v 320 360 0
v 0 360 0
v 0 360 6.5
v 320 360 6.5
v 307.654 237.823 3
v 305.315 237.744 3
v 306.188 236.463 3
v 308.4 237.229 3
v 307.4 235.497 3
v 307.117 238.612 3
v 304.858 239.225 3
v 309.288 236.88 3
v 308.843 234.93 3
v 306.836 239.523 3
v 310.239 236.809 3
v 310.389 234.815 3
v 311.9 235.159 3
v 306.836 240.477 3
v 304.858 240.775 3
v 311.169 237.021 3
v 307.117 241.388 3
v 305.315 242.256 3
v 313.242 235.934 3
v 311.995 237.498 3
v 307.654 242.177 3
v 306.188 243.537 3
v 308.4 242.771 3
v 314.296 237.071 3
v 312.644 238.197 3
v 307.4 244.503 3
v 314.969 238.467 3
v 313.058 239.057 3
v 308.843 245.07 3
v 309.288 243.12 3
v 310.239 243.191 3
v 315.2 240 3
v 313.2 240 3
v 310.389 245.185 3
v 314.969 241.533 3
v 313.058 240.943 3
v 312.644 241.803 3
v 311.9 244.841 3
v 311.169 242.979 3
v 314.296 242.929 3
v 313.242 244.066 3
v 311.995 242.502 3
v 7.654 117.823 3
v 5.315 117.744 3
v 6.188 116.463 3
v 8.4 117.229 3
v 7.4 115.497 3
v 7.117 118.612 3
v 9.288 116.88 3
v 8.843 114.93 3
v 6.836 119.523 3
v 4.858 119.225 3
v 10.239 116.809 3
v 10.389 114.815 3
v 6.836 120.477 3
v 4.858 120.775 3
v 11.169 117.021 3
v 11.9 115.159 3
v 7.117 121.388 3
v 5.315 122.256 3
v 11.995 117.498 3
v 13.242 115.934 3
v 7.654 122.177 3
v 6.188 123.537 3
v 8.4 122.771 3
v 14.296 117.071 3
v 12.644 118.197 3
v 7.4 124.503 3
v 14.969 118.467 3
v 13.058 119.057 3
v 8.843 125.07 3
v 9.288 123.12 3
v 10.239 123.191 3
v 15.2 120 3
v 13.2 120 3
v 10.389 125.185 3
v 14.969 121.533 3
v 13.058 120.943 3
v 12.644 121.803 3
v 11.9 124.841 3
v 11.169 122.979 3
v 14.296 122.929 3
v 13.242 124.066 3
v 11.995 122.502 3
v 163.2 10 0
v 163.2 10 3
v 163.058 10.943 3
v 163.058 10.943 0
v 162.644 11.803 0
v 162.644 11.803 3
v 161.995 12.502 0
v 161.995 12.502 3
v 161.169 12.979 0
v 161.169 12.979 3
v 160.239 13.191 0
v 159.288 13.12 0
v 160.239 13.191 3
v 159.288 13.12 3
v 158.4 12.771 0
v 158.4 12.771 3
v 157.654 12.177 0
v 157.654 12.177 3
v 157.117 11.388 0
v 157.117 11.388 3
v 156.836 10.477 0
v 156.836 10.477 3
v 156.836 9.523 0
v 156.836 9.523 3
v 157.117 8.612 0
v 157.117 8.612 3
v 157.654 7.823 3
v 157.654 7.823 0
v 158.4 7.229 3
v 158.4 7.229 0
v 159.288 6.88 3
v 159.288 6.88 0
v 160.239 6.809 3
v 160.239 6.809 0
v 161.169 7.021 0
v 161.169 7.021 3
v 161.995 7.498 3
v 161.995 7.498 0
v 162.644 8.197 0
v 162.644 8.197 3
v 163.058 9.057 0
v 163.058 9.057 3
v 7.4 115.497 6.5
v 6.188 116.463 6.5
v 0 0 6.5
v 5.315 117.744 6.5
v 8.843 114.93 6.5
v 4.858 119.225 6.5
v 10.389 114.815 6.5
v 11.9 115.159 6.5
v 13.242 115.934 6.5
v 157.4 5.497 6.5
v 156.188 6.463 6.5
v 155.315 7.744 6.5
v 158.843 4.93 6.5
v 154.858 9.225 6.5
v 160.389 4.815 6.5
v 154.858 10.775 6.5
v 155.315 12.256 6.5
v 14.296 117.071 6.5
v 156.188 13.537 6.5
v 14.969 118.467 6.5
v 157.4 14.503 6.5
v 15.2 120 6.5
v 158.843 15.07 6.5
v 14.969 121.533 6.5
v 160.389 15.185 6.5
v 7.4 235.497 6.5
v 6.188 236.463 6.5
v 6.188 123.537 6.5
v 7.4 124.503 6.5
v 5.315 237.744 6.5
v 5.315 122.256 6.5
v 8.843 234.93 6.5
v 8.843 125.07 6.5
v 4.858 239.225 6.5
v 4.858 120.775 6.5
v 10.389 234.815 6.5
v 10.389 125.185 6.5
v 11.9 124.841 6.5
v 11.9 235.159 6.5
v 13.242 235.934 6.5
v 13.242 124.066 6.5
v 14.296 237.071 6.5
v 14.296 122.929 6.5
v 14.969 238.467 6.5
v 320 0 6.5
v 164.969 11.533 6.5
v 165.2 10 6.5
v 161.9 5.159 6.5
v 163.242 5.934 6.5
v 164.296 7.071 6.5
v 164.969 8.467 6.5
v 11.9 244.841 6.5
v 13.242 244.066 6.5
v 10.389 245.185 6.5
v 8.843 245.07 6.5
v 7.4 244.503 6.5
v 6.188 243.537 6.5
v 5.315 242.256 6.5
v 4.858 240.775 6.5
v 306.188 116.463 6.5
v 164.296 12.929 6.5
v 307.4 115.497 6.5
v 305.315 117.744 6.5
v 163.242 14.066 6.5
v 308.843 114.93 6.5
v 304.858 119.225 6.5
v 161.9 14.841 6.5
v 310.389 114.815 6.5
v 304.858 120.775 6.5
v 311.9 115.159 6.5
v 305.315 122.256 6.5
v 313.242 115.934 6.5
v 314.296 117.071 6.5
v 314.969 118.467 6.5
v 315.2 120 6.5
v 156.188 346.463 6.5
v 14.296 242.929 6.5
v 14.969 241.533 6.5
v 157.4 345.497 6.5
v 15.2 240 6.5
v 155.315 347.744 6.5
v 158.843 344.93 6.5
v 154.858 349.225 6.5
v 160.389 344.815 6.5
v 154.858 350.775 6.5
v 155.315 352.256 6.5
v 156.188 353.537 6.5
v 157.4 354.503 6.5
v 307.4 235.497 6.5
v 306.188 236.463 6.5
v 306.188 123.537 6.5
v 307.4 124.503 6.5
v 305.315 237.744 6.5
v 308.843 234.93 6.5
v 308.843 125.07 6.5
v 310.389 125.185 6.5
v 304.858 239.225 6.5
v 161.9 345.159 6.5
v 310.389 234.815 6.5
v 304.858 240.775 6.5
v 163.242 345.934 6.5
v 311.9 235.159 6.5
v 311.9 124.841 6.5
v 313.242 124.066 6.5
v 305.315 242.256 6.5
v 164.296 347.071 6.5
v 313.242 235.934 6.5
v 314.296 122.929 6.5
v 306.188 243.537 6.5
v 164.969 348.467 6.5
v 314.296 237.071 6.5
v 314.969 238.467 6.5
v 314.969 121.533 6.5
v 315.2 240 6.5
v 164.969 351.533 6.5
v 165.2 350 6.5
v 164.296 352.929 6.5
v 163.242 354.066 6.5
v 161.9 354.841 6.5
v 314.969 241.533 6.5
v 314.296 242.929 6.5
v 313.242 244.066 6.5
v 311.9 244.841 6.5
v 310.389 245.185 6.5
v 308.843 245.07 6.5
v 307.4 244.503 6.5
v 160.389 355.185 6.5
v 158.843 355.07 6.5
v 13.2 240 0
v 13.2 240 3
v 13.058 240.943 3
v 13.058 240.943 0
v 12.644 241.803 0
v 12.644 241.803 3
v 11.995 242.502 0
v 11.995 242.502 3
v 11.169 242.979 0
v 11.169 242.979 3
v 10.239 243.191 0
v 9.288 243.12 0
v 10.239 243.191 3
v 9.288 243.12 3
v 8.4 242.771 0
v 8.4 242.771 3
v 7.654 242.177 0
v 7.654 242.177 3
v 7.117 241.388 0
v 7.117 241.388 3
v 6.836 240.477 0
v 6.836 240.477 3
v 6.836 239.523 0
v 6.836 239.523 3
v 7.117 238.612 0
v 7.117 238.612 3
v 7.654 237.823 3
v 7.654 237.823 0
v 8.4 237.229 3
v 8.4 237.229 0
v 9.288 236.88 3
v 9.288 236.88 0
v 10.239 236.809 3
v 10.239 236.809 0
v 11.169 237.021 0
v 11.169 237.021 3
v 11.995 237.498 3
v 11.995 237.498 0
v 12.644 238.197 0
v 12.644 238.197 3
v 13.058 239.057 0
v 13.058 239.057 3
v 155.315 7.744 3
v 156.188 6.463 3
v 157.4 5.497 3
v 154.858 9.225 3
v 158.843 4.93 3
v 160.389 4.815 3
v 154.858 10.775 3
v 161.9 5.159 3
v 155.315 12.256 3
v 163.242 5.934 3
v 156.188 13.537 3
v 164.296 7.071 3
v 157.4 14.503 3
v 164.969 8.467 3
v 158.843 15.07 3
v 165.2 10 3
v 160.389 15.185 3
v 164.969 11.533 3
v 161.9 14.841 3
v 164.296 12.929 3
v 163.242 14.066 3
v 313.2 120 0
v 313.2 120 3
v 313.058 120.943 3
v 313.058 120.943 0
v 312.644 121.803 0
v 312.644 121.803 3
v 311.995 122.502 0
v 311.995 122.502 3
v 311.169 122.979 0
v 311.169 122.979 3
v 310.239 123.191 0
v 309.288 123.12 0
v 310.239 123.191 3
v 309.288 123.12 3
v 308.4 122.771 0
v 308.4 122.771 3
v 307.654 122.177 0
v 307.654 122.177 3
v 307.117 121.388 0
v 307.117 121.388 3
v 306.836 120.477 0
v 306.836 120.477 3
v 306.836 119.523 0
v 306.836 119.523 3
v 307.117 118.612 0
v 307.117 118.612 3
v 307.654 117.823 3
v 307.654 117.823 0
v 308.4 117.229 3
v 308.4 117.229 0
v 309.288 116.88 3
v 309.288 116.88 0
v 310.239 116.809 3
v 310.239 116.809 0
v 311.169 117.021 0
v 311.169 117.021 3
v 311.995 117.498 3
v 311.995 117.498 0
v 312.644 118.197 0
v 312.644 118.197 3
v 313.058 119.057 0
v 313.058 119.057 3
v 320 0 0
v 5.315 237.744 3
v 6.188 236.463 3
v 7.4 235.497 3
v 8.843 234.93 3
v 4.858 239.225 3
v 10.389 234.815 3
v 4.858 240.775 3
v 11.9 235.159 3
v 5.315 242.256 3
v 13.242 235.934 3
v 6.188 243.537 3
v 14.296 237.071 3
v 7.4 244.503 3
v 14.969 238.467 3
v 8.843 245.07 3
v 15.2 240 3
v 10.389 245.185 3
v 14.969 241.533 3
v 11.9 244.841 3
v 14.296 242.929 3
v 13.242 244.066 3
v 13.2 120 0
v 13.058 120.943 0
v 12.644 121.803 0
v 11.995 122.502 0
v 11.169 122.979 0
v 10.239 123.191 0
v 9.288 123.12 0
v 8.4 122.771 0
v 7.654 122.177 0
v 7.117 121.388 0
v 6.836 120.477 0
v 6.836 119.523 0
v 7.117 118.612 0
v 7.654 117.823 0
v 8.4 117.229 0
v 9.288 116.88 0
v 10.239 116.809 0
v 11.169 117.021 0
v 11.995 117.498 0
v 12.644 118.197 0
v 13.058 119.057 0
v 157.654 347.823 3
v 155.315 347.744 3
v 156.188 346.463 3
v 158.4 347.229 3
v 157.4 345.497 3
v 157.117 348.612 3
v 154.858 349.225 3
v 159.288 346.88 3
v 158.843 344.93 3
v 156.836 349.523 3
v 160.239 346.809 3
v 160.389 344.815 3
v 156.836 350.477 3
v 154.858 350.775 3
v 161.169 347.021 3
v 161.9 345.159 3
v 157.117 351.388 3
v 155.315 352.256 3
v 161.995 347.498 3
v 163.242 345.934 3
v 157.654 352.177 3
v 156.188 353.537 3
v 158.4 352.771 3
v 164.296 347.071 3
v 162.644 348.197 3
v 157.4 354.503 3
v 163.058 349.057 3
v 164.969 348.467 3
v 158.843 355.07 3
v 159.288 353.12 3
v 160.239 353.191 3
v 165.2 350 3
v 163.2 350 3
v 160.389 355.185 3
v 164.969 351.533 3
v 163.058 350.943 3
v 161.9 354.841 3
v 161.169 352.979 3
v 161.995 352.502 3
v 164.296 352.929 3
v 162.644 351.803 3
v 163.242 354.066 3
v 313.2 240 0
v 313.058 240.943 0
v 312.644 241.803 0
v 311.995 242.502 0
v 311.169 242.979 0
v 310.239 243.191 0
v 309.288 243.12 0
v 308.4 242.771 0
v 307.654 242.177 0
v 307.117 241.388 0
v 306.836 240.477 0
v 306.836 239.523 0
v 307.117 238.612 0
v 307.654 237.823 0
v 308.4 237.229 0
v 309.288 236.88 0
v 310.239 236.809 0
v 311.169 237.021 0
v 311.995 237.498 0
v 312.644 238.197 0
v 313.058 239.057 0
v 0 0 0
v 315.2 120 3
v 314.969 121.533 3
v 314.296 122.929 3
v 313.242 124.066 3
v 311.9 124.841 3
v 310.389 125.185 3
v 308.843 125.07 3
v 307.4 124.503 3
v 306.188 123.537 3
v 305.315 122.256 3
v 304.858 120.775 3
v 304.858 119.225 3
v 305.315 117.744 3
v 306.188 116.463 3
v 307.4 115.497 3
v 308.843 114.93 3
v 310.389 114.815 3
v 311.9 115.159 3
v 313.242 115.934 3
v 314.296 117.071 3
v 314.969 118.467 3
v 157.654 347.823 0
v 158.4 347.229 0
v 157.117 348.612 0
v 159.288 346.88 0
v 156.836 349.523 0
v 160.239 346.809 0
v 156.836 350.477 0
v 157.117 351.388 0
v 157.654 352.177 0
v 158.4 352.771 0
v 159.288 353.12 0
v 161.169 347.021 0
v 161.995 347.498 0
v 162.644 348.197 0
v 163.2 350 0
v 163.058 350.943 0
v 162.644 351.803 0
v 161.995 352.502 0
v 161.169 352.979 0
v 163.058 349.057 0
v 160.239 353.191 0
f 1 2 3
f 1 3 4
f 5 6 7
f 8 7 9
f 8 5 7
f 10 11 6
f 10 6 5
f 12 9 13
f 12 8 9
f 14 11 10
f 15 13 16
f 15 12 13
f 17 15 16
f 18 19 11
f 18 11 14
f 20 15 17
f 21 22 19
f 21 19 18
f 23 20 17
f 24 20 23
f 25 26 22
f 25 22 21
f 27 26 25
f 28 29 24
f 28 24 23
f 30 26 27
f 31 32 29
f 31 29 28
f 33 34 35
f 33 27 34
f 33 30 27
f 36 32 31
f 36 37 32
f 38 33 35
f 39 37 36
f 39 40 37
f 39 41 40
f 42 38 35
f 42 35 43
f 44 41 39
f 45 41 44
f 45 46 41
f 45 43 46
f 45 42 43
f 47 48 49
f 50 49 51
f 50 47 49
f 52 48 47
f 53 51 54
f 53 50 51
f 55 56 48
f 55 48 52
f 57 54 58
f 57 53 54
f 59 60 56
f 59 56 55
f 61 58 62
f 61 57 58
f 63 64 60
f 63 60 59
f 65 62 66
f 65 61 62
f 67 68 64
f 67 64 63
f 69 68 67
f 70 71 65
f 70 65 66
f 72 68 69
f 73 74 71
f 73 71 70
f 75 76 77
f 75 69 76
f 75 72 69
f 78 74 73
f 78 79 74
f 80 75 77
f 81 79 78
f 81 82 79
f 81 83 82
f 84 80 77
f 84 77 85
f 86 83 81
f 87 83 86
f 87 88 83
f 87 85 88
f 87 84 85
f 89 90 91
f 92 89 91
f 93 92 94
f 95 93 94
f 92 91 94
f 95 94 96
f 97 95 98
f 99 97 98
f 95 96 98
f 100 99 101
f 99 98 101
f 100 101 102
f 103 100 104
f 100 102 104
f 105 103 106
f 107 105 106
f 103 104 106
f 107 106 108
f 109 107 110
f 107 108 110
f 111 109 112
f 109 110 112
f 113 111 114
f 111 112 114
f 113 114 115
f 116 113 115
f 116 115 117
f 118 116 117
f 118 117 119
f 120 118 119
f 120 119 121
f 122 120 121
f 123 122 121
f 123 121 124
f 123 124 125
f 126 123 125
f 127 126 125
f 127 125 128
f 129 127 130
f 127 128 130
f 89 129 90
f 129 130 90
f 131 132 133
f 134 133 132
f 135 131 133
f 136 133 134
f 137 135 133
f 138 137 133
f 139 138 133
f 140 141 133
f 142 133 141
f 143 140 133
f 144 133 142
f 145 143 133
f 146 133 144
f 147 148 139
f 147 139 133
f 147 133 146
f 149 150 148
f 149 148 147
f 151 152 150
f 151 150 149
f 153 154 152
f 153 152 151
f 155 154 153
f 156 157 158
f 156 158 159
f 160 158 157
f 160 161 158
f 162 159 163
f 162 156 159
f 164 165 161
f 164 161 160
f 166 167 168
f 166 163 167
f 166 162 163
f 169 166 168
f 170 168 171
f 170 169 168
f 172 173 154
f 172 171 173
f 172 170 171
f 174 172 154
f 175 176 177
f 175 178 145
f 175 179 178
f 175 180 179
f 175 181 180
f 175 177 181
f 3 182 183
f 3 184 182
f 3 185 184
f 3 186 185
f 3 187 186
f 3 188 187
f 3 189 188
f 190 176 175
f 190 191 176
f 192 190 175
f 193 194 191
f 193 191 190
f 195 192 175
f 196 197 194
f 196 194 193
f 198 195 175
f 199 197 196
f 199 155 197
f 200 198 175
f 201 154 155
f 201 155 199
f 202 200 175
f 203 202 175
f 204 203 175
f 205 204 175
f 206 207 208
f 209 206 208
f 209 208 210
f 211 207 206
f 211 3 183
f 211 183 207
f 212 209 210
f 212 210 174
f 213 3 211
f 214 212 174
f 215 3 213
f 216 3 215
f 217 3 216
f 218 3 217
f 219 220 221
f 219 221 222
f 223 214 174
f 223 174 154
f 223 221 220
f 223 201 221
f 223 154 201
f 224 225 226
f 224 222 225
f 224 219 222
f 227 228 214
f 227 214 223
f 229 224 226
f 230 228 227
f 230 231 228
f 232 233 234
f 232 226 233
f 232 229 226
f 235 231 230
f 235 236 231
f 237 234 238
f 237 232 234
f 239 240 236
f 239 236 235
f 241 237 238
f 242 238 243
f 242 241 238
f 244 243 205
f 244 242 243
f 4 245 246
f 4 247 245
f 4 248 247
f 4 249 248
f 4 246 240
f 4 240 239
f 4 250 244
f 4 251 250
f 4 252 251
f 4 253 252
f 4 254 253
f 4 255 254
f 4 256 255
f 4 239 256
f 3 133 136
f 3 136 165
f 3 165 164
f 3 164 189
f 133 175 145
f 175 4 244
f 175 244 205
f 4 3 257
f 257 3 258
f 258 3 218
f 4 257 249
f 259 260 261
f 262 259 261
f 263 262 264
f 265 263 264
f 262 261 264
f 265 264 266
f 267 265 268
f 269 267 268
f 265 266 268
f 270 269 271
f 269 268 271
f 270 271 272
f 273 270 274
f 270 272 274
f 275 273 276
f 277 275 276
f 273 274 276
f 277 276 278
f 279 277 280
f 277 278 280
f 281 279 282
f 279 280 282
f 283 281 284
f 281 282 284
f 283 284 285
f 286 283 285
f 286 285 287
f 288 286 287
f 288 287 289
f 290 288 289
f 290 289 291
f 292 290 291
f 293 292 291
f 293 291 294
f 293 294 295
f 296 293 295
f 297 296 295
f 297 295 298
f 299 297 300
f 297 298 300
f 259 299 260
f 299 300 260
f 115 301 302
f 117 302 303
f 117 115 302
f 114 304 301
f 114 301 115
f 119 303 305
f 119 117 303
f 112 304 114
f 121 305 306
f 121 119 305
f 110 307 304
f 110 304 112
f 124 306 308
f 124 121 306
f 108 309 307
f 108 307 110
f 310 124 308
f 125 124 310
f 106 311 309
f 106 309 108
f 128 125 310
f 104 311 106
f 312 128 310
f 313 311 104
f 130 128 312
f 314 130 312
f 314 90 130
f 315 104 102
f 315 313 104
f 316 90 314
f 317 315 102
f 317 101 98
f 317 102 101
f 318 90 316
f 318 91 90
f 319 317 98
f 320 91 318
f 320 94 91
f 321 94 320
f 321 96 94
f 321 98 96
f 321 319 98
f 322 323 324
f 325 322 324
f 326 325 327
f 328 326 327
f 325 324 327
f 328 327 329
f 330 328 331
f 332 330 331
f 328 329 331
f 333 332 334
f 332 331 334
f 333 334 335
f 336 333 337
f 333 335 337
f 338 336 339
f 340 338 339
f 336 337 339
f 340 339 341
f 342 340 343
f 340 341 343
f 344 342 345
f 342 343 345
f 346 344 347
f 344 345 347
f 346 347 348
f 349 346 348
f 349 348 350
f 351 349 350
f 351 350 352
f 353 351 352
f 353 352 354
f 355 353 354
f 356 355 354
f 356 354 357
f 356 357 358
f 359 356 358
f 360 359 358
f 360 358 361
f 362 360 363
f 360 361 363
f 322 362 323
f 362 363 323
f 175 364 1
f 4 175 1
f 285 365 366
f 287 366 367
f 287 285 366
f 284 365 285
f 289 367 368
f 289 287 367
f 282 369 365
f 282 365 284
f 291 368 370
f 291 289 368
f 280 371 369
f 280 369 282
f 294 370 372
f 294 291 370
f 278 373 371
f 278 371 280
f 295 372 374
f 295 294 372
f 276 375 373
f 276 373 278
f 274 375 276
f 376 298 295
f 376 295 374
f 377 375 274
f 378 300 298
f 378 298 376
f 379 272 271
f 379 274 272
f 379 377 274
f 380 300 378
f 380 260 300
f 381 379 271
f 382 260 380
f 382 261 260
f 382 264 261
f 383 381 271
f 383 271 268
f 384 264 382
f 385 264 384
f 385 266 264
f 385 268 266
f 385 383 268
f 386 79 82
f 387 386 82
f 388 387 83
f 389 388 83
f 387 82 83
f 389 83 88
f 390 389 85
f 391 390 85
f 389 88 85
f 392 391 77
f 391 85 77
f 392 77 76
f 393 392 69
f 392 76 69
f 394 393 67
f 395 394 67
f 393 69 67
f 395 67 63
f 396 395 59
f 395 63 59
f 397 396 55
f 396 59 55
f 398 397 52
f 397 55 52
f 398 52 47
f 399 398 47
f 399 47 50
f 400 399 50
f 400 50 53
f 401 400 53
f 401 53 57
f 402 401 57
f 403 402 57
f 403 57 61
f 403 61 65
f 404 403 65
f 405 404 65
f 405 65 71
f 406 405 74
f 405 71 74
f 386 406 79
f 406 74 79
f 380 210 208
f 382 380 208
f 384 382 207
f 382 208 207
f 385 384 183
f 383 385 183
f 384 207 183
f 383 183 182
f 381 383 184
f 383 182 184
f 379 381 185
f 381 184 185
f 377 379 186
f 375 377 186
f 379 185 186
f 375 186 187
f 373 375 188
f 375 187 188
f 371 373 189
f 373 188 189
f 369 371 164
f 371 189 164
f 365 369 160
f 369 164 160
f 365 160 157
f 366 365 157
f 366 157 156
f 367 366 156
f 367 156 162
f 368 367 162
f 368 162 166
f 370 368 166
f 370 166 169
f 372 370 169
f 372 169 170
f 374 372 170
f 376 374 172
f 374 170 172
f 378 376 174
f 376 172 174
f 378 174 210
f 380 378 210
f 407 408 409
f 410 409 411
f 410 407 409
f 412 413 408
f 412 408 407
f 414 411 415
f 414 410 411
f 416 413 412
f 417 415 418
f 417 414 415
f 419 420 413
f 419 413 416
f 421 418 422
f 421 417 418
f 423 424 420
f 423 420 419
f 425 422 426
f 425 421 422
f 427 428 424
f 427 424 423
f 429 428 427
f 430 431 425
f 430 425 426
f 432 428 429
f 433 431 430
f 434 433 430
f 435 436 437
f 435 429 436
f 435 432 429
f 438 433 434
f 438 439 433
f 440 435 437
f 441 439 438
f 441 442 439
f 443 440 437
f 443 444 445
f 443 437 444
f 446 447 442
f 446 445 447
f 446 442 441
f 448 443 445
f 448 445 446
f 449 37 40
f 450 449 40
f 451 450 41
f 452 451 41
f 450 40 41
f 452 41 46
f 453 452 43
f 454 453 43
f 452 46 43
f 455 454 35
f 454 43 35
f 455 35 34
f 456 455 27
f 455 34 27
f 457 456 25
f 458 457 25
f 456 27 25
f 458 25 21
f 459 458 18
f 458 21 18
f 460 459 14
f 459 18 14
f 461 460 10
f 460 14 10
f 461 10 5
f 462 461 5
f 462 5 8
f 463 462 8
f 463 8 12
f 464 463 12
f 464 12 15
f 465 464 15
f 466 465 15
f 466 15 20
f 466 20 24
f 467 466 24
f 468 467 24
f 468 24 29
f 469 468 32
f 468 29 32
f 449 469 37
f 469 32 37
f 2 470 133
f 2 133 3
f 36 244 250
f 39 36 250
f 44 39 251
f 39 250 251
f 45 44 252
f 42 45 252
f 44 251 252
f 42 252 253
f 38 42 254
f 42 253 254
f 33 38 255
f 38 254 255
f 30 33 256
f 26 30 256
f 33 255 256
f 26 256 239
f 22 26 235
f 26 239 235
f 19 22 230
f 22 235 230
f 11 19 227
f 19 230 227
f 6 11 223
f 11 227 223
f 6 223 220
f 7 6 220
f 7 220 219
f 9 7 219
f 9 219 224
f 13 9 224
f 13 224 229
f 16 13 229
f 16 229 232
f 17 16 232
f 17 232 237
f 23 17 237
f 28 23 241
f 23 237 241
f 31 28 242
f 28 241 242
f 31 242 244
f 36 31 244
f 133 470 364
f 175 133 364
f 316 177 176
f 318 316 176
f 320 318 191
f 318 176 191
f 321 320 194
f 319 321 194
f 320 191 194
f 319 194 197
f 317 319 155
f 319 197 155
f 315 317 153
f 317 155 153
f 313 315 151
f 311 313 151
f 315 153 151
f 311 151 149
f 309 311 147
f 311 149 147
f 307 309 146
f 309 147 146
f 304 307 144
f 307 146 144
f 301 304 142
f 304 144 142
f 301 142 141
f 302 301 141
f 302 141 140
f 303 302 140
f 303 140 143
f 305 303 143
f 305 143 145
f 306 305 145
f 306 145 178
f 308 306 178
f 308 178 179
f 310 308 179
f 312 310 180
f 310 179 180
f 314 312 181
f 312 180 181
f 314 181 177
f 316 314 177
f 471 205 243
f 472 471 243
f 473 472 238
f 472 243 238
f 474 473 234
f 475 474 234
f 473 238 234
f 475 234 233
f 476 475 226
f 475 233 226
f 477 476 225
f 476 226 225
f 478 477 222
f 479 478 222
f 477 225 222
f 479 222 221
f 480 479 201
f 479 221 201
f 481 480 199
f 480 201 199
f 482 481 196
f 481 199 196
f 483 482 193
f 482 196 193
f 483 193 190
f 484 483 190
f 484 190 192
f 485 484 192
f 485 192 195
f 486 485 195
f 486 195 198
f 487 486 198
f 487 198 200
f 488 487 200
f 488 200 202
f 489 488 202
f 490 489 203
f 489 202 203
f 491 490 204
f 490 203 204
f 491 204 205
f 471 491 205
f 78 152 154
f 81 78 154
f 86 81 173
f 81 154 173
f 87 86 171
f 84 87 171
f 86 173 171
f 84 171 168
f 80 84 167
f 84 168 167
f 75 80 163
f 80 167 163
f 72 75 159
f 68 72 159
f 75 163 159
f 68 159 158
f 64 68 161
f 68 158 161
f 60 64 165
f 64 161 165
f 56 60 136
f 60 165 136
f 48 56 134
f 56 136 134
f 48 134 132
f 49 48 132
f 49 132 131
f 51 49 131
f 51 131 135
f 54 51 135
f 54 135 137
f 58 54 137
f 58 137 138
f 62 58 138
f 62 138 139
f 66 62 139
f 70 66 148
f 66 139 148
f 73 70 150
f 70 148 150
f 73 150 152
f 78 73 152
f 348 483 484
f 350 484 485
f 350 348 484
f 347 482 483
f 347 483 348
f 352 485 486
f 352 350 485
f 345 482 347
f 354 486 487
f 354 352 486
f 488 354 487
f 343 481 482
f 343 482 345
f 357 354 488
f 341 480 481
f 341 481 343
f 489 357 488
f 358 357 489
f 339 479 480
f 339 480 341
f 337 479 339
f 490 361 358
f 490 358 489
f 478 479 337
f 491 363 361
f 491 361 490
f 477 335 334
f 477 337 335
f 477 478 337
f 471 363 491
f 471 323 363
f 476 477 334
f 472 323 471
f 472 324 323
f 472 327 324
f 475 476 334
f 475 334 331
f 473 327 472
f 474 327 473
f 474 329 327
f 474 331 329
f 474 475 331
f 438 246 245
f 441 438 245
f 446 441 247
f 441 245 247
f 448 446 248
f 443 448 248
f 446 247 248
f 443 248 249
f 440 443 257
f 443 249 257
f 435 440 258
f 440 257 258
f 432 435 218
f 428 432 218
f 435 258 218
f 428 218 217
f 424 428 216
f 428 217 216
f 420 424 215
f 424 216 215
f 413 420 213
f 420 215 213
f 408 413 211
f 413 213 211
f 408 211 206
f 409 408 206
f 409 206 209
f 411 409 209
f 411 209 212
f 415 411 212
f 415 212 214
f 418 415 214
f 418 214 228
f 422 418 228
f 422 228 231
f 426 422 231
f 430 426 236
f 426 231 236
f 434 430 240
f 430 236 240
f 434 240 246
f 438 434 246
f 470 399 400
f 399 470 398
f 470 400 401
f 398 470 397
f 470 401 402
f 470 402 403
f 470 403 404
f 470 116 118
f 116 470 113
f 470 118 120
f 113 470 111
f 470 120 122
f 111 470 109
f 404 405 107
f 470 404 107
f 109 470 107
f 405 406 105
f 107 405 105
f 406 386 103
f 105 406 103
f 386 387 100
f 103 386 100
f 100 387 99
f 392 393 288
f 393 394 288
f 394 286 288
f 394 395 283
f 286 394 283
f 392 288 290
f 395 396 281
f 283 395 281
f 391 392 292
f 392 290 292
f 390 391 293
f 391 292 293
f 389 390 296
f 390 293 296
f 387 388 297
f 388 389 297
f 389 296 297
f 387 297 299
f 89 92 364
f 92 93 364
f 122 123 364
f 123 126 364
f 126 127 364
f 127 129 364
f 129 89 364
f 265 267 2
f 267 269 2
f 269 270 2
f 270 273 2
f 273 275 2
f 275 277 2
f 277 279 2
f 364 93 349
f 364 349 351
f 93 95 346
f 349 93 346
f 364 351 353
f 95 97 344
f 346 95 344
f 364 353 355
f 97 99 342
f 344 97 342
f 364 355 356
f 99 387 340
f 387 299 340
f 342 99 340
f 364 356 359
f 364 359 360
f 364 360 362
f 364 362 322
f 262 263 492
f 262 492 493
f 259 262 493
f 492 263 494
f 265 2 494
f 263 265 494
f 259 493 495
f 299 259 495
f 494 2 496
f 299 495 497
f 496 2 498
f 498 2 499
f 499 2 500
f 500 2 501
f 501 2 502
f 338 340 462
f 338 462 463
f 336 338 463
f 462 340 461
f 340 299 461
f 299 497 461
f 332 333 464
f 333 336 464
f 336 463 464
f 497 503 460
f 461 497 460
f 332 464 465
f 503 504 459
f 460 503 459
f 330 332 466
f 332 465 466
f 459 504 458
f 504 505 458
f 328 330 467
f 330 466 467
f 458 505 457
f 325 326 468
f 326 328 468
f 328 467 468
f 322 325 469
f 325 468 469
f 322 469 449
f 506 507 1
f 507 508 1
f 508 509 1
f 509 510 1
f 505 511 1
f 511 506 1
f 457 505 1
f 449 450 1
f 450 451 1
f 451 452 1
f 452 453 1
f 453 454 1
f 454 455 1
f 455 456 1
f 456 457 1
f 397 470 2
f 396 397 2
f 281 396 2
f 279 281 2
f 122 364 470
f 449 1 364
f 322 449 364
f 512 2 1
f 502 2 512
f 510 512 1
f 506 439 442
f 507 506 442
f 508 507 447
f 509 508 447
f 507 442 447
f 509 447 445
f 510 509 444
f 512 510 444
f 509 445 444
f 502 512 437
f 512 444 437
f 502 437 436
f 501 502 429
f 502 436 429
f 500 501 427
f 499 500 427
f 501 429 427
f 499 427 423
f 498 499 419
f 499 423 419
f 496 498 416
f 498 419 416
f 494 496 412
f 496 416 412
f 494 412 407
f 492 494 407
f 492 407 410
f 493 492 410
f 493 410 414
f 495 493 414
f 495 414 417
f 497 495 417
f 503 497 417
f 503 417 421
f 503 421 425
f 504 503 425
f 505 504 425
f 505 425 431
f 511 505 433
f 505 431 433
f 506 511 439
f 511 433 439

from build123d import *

# Parameters (mm, degrees)
SKETCH_W        = 320
SKETCH_H        = 360
PAD_DEPTH       = 6.5
SKETCH001_R     = 5.2
POCKET_DEPTH    = 3.5
SKETCH002_R     = 3.2
POCKET001_DEPTH = 3


with BuildPart() as part:
    # Sketch → Pad (new body)
    with BuildSketch(Plane.XY):
        with Locations((160, 180)):
            Rectangle(SKETCH_W, SKETCH_H)
    extrude(amount=PAD_DEPTH)

    # Sketch001 (on Face6 of Pad) → Pocket (cut)
    with BuildSketch(Plane.XY.offset(6.5)):
        with Locations((160, 350)):
            Circle(SKETCH001_R)
        with Locations((310, 240)):
            Circle(SKETCH001_R)
        with Locations((310, 120)):
            Circle(SKETCH001_R)
        with Locations((160, 10)):
            Circle(SKETCH001_R)
        with Locations((10, 120)):
            Circle(SKETCH001_R)
        with Locations((10, 240)):
            Circle(SKETCH001_R)
    extrude(amount=-POCKET_DEPTH, mode=Mode.SUBTRACT)

    # Sketch002 (on Face17 of Pocket) → Pocket001 (cut)
    with BuildSketch(Plane.XY.offset(3)):
        with Locations((160, 350)):
            Circle(SKETCH002_R)
        with Locations((10, 240)):
            Circle(SKETCH002_R)
        with Locations((10, 120)):
            Circle(SKETCH002_R)
        with Locations((160, 10)):
            Circle(SKETCH002_R)
        with Locations((310, 120)):
            Circle(SKETCH002_R)
        with Locations((310, 240)):
            Circle(SKETCH002_R)
    extrude(amount=-POCKET001_DEPTH, mode=Mode.SUBTRACT)


solid = part.part
